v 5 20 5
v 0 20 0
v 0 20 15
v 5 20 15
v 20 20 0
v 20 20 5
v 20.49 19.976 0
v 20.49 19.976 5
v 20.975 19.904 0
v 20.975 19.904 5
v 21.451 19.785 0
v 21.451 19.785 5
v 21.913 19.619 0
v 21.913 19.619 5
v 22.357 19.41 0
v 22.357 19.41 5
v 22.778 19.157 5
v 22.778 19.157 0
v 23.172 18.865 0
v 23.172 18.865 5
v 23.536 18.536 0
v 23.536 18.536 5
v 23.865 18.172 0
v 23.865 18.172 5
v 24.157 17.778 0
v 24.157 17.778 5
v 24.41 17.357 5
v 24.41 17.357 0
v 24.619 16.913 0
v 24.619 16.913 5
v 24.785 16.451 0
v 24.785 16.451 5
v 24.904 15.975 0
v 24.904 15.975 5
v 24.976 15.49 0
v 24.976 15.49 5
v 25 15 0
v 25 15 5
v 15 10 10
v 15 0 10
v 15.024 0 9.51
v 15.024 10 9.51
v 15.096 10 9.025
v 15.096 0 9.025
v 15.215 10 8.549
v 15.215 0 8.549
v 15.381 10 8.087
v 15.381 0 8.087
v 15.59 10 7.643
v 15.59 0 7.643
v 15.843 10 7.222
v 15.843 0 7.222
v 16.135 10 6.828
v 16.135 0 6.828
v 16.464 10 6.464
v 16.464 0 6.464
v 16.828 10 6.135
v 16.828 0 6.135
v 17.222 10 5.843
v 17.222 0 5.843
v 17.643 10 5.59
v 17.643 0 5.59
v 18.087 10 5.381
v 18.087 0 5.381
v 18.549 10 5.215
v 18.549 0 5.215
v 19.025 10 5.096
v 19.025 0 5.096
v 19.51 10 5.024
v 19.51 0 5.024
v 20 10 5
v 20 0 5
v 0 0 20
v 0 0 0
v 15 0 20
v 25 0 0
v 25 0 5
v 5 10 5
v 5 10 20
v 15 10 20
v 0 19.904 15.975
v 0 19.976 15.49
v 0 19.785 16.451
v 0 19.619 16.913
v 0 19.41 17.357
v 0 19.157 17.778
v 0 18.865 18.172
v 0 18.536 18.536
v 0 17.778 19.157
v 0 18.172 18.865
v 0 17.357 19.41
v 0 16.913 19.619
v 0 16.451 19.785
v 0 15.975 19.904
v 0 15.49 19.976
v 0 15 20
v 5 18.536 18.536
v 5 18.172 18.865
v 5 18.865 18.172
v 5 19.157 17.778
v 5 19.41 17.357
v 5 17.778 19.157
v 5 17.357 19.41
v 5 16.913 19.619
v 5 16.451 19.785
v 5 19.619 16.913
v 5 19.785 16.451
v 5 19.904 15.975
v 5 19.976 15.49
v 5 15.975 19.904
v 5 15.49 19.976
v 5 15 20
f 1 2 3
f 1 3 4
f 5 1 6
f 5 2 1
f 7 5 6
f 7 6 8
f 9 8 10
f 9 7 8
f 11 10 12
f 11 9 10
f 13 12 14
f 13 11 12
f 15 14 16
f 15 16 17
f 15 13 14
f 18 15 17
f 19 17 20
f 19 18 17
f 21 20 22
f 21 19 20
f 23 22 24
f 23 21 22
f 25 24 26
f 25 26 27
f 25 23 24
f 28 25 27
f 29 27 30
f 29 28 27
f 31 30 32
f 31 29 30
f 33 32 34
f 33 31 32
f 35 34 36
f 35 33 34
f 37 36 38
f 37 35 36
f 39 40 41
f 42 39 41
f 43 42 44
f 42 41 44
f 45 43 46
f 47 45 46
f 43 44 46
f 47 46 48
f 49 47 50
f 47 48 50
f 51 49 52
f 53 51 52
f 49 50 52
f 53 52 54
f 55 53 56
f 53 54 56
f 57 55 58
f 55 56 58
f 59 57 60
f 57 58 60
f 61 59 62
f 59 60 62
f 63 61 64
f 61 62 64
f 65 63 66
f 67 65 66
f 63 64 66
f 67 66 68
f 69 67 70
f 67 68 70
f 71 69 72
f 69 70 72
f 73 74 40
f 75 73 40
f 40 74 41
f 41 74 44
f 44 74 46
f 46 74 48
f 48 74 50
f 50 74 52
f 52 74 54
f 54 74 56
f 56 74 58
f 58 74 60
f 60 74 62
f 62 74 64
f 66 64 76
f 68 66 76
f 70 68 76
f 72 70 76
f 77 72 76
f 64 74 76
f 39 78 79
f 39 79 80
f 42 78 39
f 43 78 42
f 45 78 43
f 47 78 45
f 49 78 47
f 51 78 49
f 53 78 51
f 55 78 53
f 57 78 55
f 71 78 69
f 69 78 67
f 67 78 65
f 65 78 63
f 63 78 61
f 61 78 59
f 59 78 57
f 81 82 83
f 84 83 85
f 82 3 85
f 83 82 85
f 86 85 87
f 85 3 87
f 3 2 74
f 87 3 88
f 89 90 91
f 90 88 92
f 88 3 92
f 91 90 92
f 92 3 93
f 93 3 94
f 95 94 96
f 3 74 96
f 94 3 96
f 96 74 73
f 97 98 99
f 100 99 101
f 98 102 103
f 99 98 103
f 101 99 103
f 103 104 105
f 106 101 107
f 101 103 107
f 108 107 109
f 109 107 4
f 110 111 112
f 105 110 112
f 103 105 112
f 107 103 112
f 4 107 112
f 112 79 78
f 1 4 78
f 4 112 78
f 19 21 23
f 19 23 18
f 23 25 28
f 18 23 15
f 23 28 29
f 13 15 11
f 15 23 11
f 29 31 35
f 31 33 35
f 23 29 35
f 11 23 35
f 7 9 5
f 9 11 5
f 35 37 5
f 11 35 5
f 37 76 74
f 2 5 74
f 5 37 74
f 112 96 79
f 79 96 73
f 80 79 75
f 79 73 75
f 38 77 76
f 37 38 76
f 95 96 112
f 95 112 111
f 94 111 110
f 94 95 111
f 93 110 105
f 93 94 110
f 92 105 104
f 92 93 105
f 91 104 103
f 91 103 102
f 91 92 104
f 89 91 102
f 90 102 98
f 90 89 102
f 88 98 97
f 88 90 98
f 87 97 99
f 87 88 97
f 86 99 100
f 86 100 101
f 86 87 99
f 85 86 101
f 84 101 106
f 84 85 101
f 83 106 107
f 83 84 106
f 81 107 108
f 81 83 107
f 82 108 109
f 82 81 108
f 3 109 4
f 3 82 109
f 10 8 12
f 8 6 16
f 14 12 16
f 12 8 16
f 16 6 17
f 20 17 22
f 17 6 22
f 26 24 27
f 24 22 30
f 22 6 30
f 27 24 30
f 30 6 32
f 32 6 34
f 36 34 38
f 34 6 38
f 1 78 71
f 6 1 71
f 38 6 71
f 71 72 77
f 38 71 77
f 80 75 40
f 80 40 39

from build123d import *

# Parameters (mm, degrees)
SKETCH_1_W          = 25
SKETCH_1_H          = 20
EXTRUDE_1_DEPTH     = 10
EXTRUDE_2_DEPTH     = 10
SKETCH_3_W          = 10
SKETCH_3_H          = 10
CUT_EXTRUDE_1_DEPTH = 15
FILLET_1_DEPTH      = 10
FILLET_START        = -1
FILLET_1_2_DEPTH    = 6
FILLET_1_3_DEPTH    = 6


with BuildPart() as part:
    # 草圖1 → 填料-伸長1 (new body)
    with BuildSketch(Plane(origin=(0, 0, 0), x_dir=(1, 0, 0), z_dir=(0, 1, 0))):
        with Locations((12.5, -10)):
            Rectangle(SKETCH_1_W, SKETCH_1_H)
    extrude(amount=EXTRUDE_1_DEPTH)

    # 草圖2 → 填料-伸長2 (add)
    with BuildSketch(Plane(origin=(0, 10, 0), x_dir=(1, 0, 0), z_dir=(0, 1, 0))):
        Polygon((0, 0), (0, -20), (5, -20), (5, -5), (25, -5), (25, 0), align=None)
    extrude(amount=EXTRUDE_2_DEPTH)

    # 草圖3 → 除料-伸長1 (cut)
    with BuildSketch(Plane.XY.offset(20)):
        with Locations((20, 5)):
            Rectangle(SKETCH_3_W, SKETCH_3_H)
    extrude(amount=-CUT_EXTRUDE_1_DEPTH, mode=Mode.SUBTRACT)

    # 圓角1: read off the stored shape, not the designer's step
    # 圓角1 outline → 圓角1 (add)
    with BuildSketch(Plane(origin=(0, 0, 0), x_dir=(1, 0, 0), z_dir=(0, 1, 0))):
        with BuildLine():
            ThreePointArc((15, -10), (16.464466094, -6.464466094), (20, -5))
            Line((20, -5), (15, -5))
            Line((15, -5), (15, -10))
        make_face()
    extrude(amount=FILLET_1_DEPTH)

    # Fillet 1 2 outline → Fillet 1 2 (cut)
    with BuildSketch(Plane.YZ.offset(FILLET_START)):
        with BuildLine():
            Line((20, 20), (15, 20))
            ThreePointArc((15, 20), (18.535533906, 18.535533906), (20, 15))
            Line((20, 15), (20, 20))
        make_face()
    extrude(amount=FILLET_1_2_DEPTH, mode=Mode.SUBTRACT)

    # Fillet 1 3 outline → Fillet 1 3 (cut)
    with BuildSketch(Plane.XY.offset(FILLET_START)):
        with BuildLine():
            ThreePointArc((20, 20), (23.535533906, 18.535533906), (25, 15))
            Line((25, 15), (25, 20))
            Line((25, 20), (20, 20))
        make_face()
    extrude(amount=FILLET_1_3_DEPTH, mode=Mode.SUBTRACT)


solid = part.part
